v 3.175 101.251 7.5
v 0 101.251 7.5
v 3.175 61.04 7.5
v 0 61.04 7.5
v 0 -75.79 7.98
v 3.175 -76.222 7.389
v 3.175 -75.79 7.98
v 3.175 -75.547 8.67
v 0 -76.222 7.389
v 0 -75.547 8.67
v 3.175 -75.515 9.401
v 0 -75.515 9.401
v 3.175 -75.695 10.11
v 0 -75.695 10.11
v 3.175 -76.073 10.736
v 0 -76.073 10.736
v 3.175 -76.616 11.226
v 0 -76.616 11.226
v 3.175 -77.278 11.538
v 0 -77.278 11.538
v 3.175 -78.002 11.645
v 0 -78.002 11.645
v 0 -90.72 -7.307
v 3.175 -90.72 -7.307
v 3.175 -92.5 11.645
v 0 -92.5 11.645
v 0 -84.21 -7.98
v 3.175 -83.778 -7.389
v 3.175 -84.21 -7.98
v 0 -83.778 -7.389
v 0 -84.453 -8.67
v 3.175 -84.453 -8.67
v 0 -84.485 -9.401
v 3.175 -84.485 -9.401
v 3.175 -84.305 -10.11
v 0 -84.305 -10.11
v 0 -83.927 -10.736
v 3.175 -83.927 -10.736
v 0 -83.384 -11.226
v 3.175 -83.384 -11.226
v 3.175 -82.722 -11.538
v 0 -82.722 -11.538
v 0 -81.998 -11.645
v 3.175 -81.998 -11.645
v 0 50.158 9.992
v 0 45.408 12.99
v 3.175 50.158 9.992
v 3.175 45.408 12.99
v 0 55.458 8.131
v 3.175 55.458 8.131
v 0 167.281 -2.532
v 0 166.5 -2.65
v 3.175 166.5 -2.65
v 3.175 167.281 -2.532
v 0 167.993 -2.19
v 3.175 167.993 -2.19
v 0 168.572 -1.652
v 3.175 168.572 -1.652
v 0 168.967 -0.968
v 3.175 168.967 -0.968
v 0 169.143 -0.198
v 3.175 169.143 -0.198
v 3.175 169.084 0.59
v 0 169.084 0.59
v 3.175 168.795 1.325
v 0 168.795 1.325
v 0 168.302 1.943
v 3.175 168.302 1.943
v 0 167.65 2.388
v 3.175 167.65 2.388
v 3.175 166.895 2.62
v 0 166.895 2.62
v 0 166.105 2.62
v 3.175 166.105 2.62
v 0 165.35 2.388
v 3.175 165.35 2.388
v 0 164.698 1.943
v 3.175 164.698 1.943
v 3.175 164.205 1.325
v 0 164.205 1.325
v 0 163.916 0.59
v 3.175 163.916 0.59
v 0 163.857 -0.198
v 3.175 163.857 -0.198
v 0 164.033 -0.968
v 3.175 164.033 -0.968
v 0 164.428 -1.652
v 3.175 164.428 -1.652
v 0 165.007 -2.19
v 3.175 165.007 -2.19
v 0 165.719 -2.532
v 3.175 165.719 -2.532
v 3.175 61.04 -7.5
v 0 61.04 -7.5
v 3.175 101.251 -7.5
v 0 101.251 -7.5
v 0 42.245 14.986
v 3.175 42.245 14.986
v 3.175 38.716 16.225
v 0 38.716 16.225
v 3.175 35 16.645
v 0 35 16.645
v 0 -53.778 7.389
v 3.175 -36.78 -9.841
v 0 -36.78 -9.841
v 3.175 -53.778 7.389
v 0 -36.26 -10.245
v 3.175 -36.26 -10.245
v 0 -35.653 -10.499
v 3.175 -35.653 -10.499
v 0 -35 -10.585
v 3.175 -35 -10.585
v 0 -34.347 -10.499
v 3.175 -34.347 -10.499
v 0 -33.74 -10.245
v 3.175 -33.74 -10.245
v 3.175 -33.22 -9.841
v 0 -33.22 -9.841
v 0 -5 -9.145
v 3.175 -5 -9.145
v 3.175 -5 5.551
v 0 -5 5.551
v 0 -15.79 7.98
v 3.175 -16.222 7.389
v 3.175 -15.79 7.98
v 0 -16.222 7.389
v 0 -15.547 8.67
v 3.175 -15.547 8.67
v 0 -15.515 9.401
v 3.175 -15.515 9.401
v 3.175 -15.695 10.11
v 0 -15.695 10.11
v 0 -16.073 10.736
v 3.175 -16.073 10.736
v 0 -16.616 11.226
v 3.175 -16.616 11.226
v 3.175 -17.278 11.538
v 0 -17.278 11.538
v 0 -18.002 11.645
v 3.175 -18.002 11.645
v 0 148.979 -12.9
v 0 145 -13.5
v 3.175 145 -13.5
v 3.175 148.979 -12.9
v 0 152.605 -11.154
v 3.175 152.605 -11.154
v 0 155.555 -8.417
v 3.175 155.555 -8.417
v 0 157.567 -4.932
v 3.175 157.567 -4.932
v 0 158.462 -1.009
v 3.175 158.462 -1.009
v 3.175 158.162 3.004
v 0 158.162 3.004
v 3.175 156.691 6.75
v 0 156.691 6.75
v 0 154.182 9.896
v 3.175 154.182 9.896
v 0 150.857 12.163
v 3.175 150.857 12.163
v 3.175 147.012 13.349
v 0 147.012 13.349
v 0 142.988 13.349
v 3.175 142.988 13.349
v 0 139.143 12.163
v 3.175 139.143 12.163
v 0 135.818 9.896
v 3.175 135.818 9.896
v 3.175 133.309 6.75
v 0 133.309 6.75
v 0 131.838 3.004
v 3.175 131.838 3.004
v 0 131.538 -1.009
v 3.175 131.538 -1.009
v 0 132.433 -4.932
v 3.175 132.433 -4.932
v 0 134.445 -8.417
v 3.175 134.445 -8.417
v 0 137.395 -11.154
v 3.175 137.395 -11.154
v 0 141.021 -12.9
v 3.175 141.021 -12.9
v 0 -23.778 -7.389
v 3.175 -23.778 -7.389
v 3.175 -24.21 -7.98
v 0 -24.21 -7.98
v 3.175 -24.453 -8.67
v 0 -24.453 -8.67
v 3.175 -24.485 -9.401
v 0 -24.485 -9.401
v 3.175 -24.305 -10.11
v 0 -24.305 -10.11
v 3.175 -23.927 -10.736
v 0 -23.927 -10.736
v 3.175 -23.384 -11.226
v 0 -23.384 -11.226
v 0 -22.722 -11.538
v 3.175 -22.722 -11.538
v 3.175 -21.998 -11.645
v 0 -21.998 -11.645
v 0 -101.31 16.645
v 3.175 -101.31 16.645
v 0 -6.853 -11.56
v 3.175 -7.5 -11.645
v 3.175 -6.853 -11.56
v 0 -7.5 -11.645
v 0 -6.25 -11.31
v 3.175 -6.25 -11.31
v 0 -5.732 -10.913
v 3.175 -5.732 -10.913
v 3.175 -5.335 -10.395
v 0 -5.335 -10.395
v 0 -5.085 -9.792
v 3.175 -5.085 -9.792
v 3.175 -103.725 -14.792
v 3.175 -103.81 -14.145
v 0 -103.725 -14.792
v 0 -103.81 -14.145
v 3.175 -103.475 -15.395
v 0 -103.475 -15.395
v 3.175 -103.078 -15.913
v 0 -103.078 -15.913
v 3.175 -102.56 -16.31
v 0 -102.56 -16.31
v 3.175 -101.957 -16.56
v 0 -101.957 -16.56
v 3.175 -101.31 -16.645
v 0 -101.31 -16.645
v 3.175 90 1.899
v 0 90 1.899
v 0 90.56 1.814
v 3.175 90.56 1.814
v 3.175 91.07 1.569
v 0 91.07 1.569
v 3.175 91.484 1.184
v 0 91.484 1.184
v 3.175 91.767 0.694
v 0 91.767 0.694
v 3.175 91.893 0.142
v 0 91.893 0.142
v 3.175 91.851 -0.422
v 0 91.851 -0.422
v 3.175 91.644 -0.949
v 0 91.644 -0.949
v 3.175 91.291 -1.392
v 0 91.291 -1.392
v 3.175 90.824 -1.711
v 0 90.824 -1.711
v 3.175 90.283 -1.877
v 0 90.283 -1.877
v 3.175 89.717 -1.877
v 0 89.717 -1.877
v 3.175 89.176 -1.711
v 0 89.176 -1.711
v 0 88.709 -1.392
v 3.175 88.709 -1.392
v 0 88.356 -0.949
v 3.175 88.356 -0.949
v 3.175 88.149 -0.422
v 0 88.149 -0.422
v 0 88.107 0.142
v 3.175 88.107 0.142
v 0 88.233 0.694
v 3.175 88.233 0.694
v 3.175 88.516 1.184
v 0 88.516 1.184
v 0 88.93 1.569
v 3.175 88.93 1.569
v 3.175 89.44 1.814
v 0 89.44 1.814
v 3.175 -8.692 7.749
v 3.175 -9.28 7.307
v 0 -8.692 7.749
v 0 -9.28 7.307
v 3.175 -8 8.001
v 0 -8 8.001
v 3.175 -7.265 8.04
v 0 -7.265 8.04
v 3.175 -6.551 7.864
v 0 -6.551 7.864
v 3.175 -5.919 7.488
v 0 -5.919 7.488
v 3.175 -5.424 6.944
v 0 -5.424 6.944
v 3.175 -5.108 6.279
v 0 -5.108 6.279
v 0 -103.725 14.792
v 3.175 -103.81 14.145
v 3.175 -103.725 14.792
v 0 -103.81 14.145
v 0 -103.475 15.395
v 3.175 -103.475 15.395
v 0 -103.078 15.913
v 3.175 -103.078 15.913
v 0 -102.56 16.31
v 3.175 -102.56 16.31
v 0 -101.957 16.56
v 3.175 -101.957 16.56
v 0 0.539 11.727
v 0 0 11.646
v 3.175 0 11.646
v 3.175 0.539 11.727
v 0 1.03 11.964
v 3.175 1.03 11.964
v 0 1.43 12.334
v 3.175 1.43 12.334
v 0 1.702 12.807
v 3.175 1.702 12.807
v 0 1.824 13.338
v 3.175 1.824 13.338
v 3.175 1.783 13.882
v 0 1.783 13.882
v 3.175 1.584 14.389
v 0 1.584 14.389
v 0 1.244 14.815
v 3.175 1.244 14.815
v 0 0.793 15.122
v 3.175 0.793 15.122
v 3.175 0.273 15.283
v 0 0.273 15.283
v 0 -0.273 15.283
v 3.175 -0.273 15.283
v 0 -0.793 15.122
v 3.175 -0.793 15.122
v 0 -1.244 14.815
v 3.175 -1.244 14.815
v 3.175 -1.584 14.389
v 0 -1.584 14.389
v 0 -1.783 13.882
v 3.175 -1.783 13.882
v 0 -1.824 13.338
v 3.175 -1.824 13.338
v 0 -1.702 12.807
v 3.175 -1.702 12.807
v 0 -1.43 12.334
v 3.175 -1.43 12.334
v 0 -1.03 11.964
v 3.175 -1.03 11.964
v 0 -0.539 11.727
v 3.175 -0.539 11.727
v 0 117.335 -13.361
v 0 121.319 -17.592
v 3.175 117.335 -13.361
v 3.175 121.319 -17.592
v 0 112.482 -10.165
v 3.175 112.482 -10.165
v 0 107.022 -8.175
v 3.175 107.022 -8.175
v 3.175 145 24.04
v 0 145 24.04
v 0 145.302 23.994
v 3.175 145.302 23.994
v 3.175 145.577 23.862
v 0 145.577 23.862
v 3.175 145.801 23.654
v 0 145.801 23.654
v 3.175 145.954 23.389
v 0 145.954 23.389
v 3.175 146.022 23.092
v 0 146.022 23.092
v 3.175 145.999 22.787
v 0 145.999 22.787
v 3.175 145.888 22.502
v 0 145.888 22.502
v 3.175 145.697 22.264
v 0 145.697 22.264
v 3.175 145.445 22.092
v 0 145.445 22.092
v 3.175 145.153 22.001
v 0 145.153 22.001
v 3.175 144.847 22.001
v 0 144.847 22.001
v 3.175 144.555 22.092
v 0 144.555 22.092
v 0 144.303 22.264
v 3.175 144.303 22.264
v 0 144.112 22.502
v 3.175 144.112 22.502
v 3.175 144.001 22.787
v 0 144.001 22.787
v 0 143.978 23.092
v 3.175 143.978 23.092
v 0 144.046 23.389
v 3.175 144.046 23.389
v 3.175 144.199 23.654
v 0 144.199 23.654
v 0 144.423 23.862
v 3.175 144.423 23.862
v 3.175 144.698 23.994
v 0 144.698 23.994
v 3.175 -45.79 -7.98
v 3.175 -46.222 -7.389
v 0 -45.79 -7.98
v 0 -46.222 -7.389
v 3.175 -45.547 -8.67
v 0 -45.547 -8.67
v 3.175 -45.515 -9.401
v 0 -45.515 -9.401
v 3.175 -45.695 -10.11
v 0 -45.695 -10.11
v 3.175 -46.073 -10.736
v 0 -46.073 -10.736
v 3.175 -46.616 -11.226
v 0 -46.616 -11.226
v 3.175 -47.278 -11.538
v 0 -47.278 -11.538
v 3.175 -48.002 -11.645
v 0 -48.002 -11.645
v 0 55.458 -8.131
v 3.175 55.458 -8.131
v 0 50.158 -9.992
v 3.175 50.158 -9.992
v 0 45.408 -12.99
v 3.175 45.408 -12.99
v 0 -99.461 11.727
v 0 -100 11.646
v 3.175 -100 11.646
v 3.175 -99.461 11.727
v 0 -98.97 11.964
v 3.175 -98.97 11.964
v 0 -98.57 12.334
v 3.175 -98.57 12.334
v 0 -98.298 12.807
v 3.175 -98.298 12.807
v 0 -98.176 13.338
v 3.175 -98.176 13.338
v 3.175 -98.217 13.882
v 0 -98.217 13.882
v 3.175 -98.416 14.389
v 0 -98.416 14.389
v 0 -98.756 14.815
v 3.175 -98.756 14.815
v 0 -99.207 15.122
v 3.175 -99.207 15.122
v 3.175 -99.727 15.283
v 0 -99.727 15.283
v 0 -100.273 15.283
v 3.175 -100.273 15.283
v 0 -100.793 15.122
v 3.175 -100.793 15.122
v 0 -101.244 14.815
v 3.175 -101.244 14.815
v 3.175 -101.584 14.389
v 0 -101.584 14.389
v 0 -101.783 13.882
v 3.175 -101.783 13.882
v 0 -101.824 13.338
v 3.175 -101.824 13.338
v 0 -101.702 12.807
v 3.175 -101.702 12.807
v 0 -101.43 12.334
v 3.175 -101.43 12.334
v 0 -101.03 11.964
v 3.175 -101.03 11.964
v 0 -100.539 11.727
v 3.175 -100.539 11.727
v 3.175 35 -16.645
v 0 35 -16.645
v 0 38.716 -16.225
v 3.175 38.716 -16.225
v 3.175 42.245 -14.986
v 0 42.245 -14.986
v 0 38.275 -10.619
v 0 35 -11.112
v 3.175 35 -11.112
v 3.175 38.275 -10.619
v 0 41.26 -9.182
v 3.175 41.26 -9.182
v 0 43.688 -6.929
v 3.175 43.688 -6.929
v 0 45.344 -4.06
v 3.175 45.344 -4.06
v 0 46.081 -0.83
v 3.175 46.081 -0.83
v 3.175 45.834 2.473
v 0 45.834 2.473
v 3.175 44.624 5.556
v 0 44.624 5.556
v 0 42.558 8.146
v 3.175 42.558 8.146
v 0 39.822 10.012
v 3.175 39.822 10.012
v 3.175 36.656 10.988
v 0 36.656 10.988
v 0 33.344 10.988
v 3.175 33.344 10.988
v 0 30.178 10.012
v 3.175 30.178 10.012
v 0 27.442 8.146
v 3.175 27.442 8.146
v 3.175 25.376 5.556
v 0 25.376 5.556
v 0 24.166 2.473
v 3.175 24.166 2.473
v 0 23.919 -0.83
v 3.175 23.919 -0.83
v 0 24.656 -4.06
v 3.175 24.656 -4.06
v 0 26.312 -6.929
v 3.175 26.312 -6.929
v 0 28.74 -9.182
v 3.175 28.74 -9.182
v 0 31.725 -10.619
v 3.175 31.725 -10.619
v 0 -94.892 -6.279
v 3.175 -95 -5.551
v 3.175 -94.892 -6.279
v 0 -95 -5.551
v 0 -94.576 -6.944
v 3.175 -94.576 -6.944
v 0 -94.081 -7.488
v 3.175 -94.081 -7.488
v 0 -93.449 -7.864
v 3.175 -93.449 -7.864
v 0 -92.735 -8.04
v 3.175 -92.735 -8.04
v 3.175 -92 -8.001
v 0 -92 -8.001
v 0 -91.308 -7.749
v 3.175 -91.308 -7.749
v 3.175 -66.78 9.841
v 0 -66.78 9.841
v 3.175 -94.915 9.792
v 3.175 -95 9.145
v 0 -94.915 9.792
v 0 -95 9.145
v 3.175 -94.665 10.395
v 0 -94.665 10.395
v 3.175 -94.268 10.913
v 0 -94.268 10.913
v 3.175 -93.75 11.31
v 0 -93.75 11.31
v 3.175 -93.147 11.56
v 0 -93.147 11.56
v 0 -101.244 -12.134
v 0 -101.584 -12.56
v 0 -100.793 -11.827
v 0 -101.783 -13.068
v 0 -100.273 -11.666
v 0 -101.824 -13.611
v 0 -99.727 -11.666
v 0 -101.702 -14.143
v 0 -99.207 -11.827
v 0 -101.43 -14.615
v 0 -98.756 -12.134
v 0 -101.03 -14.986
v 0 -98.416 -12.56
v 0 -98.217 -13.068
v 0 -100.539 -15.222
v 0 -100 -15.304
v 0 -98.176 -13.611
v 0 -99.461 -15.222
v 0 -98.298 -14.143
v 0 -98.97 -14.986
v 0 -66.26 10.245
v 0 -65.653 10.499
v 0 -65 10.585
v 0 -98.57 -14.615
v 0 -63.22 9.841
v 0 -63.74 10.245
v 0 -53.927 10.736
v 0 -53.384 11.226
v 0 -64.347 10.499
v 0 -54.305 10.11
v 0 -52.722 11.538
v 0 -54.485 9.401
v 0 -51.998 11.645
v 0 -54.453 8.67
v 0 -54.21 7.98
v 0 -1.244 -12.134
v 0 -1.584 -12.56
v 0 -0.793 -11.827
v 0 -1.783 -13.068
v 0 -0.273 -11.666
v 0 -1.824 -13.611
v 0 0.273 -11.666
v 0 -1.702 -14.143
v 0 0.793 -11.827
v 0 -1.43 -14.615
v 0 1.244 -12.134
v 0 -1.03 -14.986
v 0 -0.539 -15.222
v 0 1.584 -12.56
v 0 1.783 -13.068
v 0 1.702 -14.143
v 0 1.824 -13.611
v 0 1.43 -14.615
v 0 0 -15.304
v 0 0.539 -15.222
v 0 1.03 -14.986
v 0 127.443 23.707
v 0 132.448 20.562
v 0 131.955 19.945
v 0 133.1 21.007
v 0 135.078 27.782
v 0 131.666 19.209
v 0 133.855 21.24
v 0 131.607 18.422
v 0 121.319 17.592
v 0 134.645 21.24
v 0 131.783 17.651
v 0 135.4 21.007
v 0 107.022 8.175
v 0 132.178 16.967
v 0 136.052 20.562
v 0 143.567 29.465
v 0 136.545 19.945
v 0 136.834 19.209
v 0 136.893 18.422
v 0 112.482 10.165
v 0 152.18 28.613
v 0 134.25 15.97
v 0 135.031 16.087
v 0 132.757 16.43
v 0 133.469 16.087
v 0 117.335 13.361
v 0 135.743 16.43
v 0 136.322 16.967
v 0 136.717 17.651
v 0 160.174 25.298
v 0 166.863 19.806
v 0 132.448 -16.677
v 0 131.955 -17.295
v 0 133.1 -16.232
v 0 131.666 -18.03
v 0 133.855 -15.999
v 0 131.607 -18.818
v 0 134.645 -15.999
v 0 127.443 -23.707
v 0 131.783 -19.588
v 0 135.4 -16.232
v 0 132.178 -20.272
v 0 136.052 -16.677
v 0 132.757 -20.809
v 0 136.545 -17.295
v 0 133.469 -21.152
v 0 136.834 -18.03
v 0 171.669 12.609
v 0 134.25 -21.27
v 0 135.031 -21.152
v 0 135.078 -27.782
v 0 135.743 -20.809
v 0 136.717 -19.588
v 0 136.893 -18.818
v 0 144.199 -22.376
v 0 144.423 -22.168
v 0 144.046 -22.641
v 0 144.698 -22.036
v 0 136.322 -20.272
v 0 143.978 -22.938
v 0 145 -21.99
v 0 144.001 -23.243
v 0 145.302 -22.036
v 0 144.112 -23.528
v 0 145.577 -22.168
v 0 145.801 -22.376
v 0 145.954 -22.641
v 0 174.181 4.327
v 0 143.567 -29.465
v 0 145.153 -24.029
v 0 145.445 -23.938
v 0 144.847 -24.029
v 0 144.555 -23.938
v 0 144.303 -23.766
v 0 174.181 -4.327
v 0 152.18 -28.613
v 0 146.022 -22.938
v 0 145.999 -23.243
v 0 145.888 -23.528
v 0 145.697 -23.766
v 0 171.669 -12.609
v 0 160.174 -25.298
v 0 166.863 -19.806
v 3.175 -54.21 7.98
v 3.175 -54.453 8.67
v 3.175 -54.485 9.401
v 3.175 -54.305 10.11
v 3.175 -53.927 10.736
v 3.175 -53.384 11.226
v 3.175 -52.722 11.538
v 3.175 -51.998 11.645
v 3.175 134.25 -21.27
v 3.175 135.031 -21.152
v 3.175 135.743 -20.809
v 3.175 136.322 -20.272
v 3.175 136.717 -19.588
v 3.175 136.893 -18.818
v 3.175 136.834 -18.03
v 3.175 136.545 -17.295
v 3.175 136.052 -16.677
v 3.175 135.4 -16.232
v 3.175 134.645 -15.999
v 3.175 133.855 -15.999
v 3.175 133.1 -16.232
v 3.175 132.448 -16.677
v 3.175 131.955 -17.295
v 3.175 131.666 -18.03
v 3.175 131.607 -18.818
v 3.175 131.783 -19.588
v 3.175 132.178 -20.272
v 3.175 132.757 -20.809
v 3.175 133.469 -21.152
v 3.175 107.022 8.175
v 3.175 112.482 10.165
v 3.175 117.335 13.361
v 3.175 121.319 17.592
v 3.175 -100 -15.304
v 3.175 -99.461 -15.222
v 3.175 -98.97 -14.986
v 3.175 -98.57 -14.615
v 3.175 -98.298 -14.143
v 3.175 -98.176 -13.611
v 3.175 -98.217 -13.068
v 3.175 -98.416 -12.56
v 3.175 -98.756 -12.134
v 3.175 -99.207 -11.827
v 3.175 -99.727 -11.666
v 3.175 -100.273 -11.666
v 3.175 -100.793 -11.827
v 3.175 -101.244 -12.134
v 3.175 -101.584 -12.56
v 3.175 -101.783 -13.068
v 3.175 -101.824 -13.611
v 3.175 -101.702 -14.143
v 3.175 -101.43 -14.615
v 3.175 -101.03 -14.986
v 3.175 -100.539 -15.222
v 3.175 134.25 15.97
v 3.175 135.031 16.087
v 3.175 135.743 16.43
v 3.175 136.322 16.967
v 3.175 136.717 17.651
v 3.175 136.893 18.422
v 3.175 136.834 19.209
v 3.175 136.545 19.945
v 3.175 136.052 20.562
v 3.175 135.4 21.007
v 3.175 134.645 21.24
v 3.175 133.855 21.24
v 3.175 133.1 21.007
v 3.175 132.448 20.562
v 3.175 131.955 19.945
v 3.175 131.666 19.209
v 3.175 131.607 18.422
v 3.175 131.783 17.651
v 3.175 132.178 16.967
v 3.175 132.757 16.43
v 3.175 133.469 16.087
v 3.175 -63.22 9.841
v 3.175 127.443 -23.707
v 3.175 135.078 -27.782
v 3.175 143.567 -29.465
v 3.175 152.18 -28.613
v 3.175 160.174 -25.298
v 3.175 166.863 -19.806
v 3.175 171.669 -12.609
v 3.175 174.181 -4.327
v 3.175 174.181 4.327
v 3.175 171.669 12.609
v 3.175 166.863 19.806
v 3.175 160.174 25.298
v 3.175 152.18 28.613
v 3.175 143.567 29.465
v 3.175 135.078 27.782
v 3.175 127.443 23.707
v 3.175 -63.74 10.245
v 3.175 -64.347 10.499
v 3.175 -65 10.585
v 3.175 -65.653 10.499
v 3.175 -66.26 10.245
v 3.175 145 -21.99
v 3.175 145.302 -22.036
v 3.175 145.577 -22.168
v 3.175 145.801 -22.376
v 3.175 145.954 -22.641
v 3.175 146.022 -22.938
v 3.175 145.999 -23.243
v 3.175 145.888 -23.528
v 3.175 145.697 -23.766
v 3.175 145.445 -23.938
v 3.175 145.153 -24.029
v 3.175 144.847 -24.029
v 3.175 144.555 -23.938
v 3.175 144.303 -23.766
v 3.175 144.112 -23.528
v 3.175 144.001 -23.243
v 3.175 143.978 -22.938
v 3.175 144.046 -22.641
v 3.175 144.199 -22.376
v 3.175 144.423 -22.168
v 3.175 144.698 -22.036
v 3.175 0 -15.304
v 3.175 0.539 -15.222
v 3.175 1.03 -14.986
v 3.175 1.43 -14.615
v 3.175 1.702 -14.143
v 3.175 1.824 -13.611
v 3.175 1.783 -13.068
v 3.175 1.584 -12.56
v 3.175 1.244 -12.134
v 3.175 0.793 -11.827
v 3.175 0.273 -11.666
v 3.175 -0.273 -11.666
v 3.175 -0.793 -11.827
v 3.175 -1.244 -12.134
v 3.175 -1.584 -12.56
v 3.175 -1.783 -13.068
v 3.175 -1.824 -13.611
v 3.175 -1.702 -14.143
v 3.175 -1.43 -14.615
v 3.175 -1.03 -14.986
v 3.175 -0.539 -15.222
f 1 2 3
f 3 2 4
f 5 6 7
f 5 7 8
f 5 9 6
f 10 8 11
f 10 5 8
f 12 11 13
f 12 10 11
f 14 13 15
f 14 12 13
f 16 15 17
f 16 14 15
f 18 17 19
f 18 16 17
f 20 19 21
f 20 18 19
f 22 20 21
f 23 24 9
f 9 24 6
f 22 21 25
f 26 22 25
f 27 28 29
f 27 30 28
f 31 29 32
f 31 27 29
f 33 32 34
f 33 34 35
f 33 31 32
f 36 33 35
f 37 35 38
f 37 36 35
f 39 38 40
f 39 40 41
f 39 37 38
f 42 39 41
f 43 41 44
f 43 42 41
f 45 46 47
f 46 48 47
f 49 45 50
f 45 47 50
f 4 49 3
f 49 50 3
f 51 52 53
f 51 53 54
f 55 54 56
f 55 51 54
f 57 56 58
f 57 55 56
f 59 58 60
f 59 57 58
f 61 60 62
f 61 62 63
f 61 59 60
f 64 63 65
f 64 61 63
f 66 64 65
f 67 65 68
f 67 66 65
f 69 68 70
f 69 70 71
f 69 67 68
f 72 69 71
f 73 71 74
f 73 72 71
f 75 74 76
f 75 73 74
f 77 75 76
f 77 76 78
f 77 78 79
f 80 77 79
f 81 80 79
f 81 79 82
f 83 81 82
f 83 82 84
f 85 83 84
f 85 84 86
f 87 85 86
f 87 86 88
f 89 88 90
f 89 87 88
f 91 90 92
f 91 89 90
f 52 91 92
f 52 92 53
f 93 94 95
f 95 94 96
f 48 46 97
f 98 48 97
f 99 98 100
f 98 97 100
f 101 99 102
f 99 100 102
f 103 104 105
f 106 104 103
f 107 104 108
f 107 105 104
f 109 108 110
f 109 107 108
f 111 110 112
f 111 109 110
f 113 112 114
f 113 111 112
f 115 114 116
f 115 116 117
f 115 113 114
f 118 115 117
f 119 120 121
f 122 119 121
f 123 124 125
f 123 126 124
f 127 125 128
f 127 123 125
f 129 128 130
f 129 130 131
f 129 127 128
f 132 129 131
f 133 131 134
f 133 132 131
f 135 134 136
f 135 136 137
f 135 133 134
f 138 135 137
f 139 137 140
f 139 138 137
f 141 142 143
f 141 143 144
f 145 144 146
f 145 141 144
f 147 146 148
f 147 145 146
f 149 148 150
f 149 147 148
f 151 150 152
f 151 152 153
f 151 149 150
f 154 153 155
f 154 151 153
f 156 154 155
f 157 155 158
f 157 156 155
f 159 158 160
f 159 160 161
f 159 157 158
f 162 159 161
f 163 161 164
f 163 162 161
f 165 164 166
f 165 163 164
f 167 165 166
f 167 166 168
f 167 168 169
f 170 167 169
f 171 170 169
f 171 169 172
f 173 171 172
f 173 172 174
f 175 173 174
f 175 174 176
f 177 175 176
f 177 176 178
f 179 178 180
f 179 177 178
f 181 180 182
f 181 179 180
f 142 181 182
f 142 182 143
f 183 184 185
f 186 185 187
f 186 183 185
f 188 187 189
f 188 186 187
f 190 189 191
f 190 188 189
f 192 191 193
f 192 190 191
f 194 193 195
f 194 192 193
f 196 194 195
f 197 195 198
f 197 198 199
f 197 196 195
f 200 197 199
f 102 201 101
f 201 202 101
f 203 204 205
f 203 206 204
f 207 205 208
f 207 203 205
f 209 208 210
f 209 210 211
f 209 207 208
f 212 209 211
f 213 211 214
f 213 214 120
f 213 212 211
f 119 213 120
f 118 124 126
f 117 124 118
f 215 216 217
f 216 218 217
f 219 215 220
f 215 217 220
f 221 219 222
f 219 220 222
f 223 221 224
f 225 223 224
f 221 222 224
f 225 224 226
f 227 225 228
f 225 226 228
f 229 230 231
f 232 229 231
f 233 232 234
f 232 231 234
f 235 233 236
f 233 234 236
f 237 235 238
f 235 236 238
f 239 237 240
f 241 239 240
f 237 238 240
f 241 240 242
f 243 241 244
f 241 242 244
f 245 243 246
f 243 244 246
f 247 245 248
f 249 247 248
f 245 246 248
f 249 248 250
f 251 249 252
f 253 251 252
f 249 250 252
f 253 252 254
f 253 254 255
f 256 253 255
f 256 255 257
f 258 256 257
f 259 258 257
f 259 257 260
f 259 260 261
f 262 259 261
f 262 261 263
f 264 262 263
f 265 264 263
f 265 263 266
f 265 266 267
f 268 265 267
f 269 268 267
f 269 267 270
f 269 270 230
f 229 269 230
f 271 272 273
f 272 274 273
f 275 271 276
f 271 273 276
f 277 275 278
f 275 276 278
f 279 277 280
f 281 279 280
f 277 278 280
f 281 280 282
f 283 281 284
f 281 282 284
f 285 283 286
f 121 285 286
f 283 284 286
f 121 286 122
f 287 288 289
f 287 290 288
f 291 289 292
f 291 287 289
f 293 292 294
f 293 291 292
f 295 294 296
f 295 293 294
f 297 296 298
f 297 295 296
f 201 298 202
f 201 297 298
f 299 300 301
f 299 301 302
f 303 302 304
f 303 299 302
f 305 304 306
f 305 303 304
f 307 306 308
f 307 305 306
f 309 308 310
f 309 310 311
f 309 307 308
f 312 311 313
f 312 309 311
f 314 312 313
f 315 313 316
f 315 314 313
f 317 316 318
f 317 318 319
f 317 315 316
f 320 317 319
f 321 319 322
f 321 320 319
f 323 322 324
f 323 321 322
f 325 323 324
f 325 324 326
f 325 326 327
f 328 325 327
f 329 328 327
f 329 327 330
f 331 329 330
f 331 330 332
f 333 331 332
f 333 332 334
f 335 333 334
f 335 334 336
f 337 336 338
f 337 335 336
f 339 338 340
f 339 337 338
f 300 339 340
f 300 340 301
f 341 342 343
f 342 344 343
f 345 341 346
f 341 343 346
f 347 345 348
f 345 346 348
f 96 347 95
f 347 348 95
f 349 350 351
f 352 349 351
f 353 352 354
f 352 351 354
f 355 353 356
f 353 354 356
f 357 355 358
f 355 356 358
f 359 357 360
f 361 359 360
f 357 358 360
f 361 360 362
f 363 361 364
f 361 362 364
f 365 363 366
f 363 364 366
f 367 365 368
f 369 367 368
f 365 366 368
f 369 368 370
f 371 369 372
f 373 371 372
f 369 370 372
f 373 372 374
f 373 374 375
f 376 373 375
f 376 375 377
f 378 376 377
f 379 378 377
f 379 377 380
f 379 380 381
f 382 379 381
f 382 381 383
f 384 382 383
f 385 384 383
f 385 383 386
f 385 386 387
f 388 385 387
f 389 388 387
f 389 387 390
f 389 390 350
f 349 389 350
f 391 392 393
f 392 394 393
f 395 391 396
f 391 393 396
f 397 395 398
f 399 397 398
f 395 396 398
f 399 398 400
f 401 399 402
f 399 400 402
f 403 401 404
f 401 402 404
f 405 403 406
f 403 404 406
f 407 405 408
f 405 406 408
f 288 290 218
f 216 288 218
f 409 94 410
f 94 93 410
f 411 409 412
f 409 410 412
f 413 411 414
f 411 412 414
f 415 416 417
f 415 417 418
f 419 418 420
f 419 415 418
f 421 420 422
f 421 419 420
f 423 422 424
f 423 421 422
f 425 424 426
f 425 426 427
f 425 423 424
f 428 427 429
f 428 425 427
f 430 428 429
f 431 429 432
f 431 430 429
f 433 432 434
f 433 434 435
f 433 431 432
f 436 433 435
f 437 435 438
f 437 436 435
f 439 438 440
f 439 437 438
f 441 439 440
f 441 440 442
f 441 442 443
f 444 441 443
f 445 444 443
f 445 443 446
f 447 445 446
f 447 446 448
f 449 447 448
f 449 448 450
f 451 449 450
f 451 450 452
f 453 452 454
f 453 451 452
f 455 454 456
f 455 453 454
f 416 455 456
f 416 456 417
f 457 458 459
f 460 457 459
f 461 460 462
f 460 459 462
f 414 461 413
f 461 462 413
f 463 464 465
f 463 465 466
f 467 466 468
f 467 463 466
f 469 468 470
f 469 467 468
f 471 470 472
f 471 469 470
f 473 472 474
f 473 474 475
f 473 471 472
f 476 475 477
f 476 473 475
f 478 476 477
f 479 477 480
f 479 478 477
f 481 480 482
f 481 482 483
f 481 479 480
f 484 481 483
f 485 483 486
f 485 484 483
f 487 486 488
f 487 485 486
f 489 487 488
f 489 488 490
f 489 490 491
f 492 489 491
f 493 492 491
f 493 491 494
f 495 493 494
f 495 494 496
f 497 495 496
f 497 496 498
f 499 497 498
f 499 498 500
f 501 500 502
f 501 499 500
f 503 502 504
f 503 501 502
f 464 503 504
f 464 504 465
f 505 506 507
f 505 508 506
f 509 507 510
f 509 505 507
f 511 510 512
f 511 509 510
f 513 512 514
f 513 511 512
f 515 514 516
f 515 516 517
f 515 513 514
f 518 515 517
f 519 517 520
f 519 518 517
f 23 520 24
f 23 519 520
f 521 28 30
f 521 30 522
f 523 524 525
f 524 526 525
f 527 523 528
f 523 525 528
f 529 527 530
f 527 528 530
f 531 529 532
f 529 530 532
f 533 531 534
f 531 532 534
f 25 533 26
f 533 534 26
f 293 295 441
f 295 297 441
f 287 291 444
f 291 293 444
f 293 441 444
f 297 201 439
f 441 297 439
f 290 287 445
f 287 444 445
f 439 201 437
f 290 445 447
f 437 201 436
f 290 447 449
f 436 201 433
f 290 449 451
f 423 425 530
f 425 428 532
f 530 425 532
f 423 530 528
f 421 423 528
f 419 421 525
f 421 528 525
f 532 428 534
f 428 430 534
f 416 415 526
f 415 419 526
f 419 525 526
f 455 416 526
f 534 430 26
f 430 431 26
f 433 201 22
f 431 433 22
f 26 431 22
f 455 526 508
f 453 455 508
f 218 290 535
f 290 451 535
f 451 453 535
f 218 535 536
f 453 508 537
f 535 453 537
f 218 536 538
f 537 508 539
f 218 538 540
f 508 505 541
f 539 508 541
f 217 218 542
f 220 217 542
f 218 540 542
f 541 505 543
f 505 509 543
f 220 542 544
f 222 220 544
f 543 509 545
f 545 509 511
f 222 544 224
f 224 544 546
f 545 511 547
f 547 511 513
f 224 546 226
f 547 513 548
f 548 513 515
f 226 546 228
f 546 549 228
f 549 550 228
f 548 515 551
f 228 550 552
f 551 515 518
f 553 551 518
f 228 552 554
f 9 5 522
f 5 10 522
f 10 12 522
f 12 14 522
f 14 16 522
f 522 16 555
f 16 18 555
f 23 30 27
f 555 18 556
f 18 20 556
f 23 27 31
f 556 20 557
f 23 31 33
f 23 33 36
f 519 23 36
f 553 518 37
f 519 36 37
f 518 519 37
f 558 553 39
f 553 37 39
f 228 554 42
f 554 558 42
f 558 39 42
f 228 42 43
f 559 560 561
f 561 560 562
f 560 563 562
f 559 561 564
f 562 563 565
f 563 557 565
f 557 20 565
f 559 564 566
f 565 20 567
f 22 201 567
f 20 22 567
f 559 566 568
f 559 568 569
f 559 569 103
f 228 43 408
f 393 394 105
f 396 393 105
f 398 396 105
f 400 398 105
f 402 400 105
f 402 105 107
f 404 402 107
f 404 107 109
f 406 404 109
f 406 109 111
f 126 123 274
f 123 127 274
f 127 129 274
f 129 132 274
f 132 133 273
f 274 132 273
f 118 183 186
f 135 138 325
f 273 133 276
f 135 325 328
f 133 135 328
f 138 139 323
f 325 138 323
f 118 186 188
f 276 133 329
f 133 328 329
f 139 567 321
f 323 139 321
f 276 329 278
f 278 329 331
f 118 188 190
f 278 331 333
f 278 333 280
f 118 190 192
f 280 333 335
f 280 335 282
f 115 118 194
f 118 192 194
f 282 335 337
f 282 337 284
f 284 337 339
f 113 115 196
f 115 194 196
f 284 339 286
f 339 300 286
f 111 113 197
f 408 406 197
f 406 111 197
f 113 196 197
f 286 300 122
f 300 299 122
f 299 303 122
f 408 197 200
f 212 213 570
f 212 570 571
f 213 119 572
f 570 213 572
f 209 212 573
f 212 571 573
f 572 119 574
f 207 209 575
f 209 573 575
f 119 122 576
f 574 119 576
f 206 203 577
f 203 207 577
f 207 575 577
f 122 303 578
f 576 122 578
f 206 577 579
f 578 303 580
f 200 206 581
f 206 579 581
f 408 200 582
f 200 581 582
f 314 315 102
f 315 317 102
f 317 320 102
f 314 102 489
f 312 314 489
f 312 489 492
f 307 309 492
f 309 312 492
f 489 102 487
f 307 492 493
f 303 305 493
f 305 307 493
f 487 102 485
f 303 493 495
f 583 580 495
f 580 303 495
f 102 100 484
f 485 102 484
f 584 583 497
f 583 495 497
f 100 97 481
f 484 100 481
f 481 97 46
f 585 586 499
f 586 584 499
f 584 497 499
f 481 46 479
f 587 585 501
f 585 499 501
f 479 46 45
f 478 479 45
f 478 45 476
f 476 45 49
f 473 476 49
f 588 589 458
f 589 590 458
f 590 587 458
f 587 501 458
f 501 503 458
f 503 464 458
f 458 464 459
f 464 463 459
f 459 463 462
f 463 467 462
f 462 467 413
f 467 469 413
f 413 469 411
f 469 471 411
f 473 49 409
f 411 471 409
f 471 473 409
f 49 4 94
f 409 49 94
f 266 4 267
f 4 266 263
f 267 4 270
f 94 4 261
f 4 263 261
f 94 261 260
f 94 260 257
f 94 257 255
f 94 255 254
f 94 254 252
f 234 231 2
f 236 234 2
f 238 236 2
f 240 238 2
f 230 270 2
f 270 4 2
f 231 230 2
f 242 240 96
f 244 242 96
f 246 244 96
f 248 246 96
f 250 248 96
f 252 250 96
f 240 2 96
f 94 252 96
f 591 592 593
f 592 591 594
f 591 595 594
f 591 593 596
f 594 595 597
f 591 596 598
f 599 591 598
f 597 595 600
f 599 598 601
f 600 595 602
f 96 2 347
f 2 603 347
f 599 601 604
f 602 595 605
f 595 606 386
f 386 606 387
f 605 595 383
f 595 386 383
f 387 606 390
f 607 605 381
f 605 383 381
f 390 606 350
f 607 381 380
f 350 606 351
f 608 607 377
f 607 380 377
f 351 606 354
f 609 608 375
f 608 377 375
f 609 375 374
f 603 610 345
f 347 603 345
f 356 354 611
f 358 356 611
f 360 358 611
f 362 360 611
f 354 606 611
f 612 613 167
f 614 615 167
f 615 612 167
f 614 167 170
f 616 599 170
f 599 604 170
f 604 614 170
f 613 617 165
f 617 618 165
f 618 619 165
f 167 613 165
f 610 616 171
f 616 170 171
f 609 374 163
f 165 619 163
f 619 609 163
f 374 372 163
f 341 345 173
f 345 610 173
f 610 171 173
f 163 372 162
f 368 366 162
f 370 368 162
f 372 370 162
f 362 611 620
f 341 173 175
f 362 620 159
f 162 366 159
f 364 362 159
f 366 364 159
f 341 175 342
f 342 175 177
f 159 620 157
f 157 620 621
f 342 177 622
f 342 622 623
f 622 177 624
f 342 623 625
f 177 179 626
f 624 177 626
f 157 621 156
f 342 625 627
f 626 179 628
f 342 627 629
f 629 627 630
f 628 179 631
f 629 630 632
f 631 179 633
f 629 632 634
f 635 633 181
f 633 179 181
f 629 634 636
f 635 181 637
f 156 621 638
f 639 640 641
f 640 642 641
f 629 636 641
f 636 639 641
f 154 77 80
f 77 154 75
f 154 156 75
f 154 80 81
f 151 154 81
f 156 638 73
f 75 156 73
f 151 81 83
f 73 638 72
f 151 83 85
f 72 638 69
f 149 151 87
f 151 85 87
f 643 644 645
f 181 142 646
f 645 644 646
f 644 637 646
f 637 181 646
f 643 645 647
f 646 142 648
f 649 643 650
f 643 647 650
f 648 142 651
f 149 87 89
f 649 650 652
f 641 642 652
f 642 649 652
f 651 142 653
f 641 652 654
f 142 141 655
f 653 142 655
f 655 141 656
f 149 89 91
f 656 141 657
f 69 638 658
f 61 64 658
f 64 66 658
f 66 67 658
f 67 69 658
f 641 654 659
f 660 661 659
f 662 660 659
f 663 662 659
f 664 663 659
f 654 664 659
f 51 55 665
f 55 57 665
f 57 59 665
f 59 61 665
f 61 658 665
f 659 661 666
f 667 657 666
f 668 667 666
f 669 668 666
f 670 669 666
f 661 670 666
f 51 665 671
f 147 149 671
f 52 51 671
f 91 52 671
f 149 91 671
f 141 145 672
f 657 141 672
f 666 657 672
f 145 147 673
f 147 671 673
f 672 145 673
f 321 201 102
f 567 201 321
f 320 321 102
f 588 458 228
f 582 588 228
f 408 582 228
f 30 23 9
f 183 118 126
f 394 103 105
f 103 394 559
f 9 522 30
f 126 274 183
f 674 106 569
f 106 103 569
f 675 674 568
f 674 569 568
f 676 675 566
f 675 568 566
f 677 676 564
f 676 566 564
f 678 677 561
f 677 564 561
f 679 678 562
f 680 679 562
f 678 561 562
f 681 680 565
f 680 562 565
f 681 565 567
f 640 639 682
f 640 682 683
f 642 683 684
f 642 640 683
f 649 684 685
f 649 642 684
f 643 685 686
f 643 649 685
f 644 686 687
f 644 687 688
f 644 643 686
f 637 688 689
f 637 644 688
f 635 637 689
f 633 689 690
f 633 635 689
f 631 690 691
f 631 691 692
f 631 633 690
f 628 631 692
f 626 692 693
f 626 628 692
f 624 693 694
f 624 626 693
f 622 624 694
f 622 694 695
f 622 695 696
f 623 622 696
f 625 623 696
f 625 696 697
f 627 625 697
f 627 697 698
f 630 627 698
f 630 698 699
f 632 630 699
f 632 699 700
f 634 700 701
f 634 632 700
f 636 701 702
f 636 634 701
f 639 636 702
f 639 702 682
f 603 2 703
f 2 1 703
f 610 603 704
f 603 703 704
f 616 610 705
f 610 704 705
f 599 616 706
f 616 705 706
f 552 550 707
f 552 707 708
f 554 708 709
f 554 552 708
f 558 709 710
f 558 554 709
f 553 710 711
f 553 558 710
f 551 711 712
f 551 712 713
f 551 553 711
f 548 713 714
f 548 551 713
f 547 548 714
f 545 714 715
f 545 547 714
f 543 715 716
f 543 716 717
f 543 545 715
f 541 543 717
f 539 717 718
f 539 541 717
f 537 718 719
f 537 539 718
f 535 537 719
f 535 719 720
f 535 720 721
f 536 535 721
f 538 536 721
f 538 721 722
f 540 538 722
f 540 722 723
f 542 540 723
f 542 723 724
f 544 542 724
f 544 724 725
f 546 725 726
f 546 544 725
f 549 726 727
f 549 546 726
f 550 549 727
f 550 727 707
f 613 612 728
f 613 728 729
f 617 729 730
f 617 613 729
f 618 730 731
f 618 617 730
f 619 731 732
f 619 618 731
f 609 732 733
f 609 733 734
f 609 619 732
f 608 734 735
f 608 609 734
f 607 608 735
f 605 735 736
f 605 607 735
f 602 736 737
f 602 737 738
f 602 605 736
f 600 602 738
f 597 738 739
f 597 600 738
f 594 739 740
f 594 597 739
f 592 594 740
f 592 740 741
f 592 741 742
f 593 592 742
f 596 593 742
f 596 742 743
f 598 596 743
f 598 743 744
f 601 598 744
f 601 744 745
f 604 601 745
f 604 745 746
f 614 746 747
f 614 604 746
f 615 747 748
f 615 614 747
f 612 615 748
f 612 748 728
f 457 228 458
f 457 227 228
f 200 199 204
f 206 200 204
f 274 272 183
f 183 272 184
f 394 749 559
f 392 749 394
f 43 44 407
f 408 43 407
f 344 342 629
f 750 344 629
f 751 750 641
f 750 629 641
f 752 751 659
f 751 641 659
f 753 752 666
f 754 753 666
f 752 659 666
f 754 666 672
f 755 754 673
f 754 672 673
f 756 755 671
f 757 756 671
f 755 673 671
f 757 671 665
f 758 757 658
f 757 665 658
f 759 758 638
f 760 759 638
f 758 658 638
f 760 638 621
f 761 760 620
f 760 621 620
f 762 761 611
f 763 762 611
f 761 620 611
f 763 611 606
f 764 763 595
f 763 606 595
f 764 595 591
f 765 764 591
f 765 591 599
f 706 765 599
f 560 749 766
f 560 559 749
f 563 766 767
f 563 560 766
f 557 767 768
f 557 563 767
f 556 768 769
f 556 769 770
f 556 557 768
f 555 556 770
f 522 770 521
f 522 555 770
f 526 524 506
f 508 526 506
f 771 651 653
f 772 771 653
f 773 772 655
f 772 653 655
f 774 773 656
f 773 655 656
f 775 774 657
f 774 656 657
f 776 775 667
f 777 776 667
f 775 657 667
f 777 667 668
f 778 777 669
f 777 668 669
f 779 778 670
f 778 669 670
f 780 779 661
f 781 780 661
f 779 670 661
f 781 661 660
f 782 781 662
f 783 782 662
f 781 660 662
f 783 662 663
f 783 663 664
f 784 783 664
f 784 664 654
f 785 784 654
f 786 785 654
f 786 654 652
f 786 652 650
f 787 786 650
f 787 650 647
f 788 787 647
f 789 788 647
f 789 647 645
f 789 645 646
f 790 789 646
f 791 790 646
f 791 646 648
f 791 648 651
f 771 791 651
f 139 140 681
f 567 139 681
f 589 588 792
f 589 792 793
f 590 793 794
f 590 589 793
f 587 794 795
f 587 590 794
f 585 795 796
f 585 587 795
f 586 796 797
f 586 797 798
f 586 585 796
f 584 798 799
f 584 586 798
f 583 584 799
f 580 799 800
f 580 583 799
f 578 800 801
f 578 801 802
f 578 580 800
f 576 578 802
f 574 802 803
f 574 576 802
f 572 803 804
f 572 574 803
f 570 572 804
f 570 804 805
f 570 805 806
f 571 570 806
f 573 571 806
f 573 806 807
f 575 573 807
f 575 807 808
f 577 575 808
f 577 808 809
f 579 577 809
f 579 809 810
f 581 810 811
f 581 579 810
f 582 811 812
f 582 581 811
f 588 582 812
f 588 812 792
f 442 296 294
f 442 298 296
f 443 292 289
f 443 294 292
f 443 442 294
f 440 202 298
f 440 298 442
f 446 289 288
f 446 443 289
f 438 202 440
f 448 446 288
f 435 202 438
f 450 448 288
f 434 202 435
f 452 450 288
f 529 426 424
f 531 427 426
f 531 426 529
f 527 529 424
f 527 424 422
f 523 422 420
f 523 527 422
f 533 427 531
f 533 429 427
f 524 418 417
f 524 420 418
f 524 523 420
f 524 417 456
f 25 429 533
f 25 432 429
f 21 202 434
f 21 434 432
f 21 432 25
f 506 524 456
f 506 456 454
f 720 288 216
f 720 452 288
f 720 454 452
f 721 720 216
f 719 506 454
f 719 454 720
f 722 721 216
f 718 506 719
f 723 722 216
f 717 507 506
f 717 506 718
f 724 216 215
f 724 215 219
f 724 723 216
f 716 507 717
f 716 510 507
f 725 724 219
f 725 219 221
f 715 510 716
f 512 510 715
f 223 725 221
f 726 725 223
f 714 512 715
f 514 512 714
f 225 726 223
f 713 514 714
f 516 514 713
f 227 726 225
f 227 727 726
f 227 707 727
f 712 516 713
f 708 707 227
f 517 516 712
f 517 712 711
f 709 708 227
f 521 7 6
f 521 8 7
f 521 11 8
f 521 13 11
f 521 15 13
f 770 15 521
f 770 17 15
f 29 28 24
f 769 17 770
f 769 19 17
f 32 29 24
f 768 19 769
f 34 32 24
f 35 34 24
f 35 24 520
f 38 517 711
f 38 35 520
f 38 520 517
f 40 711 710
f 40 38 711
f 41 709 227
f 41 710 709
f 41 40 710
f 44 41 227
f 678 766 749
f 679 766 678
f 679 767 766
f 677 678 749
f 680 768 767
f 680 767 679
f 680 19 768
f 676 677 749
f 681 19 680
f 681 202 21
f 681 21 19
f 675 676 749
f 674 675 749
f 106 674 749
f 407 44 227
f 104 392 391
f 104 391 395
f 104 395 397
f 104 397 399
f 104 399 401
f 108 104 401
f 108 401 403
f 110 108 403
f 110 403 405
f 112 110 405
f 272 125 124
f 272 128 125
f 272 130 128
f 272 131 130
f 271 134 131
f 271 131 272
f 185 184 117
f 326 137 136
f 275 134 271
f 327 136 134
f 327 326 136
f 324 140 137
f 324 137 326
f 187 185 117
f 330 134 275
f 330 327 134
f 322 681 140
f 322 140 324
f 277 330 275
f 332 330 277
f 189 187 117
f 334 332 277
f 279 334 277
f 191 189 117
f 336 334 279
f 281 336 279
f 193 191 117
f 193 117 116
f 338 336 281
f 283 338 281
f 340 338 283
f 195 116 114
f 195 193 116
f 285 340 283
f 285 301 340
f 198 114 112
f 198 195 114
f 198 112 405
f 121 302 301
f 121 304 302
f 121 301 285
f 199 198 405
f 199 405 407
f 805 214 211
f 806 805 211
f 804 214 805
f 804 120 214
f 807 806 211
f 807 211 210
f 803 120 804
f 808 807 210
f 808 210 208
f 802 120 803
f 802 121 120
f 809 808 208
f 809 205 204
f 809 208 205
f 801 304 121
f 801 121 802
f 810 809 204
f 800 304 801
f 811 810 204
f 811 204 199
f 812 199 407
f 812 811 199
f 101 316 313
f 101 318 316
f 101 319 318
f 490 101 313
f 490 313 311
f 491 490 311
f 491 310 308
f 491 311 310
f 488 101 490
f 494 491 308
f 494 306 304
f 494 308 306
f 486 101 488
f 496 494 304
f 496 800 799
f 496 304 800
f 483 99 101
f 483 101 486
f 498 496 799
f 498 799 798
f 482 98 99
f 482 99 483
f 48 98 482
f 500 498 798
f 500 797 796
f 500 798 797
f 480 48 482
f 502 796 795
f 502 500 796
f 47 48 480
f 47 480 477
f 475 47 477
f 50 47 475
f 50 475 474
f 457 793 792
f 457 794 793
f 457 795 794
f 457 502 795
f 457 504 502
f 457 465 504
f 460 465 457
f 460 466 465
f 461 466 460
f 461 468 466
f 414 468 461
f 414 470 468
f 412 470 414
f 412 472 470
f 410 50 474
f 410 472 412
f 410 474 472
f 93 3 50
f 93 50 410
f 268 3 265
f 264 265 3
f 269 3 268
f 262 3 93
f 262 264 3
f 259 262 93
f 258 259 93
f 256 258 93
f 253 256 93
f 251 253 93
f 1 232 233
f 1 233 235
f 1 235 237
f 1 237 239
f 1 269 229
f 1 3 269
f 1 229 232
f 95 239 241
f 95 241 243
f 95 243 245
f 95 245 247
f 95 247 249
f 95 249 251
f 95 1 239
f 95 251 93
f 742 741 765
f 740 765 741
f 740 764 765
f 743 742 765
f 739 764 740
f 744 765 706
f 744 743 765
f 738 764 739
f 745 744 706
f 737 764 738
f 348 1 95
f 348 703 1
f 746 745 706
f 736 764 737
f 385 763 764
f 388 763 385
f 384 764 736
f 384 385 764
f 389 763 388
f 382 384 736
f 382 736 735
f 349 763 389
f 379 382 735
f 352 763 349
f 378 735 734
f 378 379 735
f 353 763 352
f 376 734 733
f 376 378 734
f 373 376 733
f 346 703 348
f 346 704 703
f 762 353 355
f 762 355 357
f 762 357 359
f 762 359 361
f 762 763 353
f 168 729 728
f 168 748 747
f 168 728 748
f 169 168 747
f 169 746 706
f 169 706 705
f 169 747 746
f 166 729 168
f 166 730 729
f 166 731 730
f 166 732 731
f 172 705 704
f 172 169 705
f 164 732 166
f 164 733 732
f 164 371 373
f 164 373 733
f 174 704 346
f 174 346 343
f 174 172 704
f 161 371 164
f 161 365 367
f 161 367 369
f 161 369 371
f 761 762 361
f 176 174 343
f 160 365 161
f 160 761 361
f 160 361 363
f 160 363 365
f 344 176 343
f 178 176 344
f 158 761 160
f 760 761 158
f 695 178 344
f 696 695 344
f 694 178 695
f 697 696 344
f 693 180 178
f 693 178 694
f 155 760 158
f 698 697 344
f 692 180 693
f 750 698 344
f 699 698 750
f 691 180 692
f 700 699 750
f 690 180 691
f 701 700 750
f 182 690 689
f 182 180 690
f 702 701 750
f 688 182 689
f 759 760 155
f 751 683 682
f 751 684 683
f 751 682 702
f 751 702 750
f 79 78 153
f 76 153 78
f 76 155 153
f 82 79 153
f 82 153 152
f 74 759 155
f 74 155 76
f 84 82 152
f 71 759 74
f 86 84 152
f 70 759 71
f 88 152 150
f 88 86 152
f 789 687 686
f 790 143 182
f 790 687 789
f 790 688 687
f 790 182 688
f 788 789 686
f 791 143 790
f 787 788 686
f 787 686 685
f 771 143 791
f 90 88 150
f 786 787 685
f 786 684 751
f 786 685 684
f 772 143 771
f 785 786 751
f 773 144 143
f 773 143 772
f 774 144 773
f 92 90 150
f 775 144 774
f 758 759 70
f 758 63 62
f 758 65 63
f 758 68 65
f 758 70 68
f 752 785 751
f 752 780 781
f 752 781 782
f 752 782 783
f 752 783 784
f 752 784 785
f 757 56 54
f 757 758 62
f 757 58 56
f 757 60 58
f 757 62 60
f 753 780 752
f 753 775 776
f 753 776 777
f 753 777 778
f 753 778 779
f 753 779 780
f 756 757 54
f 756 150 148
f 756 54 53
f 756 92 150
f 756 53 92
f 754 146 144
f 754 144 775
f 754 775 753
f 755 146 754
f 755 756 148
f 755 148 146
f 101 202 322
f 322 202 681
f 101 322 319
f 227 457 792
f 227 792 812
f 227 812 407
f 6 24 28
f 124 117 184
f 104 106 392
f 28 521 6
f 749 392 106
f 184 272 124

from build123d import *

# Parameters (mm, degrees)
SKETCH1_R                = 13.5
SKETCH1_R_2              = 1.8288
SKETCH1_R_3              = 11.1125
SKETCH1_R_4              = 2.65
BOSS_EXTRUDE1_DEPTH      = 3.175
CUT_EXTRUDE1_REACH       = 179.004
SKETCH2_W                = 4.112404804
SKETCH2_H                = 127.6975
FILLET3_R                = 2.5
FILLET4_R                = 25
M2_5X0_45_TAPPED_HOLE1_D = 2.05
F_6_CLEARANCE_HOLE1_D    = 3.7973


with BuildPart() as part:
    # Sketch1 → Boss-Extrude1 (new body)
    with BuildSketch(Plane(origin=(0, 0, 0), x_dir=(0, 0, -1), z_dir=(1, 0, 0))):
        with BuildLine():
            Line((20.757404804, -103.81), (20.757404804, -5))
            Line((20.757404804, -5), (16.645, 5.681808734))
            Line((16.645, 5.681808734), (16.645, 35))
            ThreePointArc((16.645, 35), (14.175569213, 43.724062271), (7.5, 49.85954323))
            Line((7.5, 49.85954323), (7.5, 116.469314765))
            ThreePointArc((7.5, 116.469314765), (0, 174.5), (-7.5, 116.469314765))
            Line((-7.5, 116.469314765), (-7.5, 49.85954323))
            ThreePointArc((-7.5, 49.85954323), (-14.175569213, 43.724062271), (-16.645, 35))
            Line((-16.645, 35), (-16.645, 5.681808734))
            Line((-16.645, 5.681808734), (-20.757404804, -5))
            Line((-20.757404804, -5), (-20.757404804, -103.81))
            Line((-20.757404804, -103.81), (20.757404804, -103.81))
        make_face()
        with Locations((0, 145)):
            Circle(SKETCH1_R, mode=Mode.SUBTRACT)
        with Locations((-13.4747, -100)):
            Circle(SKETCH1_R_2, mode=Mode.SUBTRACT)
        with Locations((13.4747, -100)):
            Circle(SKETCH1_R_2, mode=Mode.SUBTRACT)
        with Locations((-13.4747, 0)):
            Circle(SKETCH1_R_2, mode=Mode.SUBTRACT)
        with Locations((13.4747, 0)):
            Circle(SKETCH1_R_2, mode=Mode.SUBTRACT)
        with Locations((0, 35)):
            Circle(SKETCH1_R_3, mode=Mode.SUBTRACT)
        with Locations((18.619546181, 134.25)):
            Circle(SKETCH1_R_4, mode=Mode.SUBTRACT)
        with Locations((0, 166.5)):
            Circle(SKETCH1_R_4, mode=Mode.SUBTRACT)
        with Locations((-18.619546181, 134.25)):
            Circle(SKETCH1_R_4, mode=Mode.SUBTRACT)
    extrude(amount=BOSS_EXTRUDE1_DEPTH)

    # Sketch2 → Cut-Extrude1 (cut, up to next)
    with BuildSketch(Plane(origin=(3.175, 0, 0), x_dir=(0, 0, -1), z_dir=(1, 0, 0)), mode=Mode.PRIVATE) as cut_extrude1_sk1:
        Polygon((11.645, -5), (-11.645, -5), (11.645, -27.976379872), align=None)
    cut_extrude1_tool1 = extrude(cut_extrude1_sk1.sketch, amount=-CUT_EXTRUDE1_REACH, mode=Mode.PRIVATE) & part.part
    # Sketch2 → Cut-Extrude1 (cut, up to next)
    with BuildSketch(Plane(origin=(3.175, 0, 0), x_dir=(0, 0, -1), z_dir=(1, 0, 0)), mode=Mode.PRIVATE) as cut_extrude1_sk2:
        Polygon((-11.645, -12.023620128), (11.645, -35), (-11.645, -57.976379872), (-11.645, -35), align=None)
    cut_extrude1_tool2 = extrude(cut_extrude1_sk2.sketch, amount=-CUT_EXTRUDE1_REACH, mode=Mode.PRIVATE) & part.part
    # Sketch2 → Cut-Extrude1 (cut, up to next)
    with BuildSketch(Plane(origin=(3.175, 0, 0), x_dir=(0, 0, -1), z_dir=(1, 0, 0)), mode=Mode.PRIVATE) as cut_extrude1_sk3:
        Polygon((-11.645, -72.023620128), (-11.645, -95), (11.645, -95), align=None)
    cut_extrude1_tool3 = extrude(cut_extrude1_sk3.sketch, amount=-CUT_EXTRUDE1_REACH, mode=Mode.PRIVATE) & part.part
    # Sketch2 → Cut-Extrude1 (cut, up to next)
    with BuildSketch(Plane(origin=(3.175, 0, 0), x_dir=(0, 0, -1), z_dir=(1, 0, 0)), mode=Mode.PRIVATE) as cut_extrude1_sk4:
        Polygon((11.645, -42.023620128), (11.645, -65), (11.645, -87.976379872), (-11.645, -65), align=None)
    cut_extrude1_tool4 = extrude(cut_extrude1_sk4.sketch, amount=-CUT_EXTRUDE1_REACH, mode=Mode.PRIVATE) & part.part
    # Sketch2 → Cut-Extrude1 (cut, up to next)
    with BuildSketch(Plane(origin=(3.175, 0, 0), x_dir=(0, 0, -1), z_dir=(1, 0, 0)), mode=Mode.PRIVATE) as cut_extrude1_sk5:
        with Locations((-18.701202402, -39.96125)):
            Rectangle(SKETCH2_W, SKETCH2_H)
    cut_extrude1_tool5 = extrude(cut_extrude1_sk5.sketch, amount=-CUT_EXTRUDE1_REACH, mode=Mode.PRIVATE) & part.part
    # Sketch2 → Cut-Extrude1 (cut, up to next)
    with BuildSketch(Plane(origin=(3.175, 0, 0), x_dir=(0, 0, -1), z_dir=(1, 0, 0)), mode=Mode.PRIVATE) as cut_extrude1_sk6:
        with Locations((18.701202402, -39.96125)):
            Rectangle(SKETCH2_W, SKETCH2_H)
    cut_extrude1_tool6 = extrude(cut_extrude1_sk6.sketch, amount=-CUT_EXTRUDE1_REACH, mode=Mode.PRIVATE) & part.part
    add(cut_extrude1_tool1.solids().sort_by_distance((3.175, -12.658793, -3.881667))[0], mode=Mode.SUBTRACT)
    add(cut_extrude1_tool2.solids().sort_by_distance((3.175, -35, 3.881667))[0], mode=Mode.SUBTRACT)
    add(cut_extrude1_tool3.solids().sort_by_distance((3.175, -87.341207, 3.881667))[0], mode=Mode.SUBTRACT)
    add(cut_extrude1_tool4.solids().sort_by_distance((3.175, -65, -3.881667))[0], mode=Mode.SUBTRACT)
    add(cut_extrude1_tool5.solids().sort_by_distance((3.175, -39.96125, 18.701202))[0], mode=Mode.SUBTRACT)
    add(cut_extrude1_tool6.solids().sort_by_distance((3.175, -39.96125, -18.701202))[0], mode=Mode.SUBTRACT)

    # Fillet3
    fillet3_edges = [part.edges().sort_by_distance(p)[0] for p in [
        (1.5875, -103.81, 16.645),
        (1.5875, -12.023620128, 11.645),
        (1.5875, -35, -11.645),
        (1.5875, -57.976379872, 11.645),
        (1.5875, -103.81, -16.645),
        (1.5875, -72.023620128, 11.645),
        (1.5875, -95, -11.645),
        (1.5875, -95, 11.645),
        (1.5875, -87.976379872, -11.645),
        (1.5875, -65, 11.645),
        (1.5875, -42.023620128, -11.645),
        (1.5875, -27.976379872, -11.645),
        (1.5875, -5, 11.645),
        (1.5875, -5, -11.645),
    ]]
    fillet(fillet3_edges, radius=FILLET3_R)

    # Fillet4
    fillet4_edges = [part.edges().sort_by_distance(p)[0] for p in [
        (1.5875, 49.85954323, 7.5),
        (1.5875, 116.469314765, 7.5),
        (1.5875, 116.469314765, -7.5),
        (1.5875, 49.85954323, -7.5),
    ]]
    fillet(fillet4_edges, radius=FILLET4_R)

    # M2.5x0.45 Tapped Hole1 (through all)
    with Locations(Plane(origin=(3.175, 0, 0), x_dir=(0, 0, -1), z_dir=(1, 0, 0))):
        with Locations((23.015, 145), (-23.015, 145)):
            Hole(M2_5X0_45_TAPPED_HOLE1_D / 2)

    # #6 Clearance Hole1 (through all)
    with Locations(Plane(origin=(3.175, 0, 0), x_dir=(0, 0, -1), z_dir=(1, 0, 0))):
        with Locations((0, 90)):
            Hole(F_6_CLEARANCE_HOLE1_D / 2)


solid = part.part
